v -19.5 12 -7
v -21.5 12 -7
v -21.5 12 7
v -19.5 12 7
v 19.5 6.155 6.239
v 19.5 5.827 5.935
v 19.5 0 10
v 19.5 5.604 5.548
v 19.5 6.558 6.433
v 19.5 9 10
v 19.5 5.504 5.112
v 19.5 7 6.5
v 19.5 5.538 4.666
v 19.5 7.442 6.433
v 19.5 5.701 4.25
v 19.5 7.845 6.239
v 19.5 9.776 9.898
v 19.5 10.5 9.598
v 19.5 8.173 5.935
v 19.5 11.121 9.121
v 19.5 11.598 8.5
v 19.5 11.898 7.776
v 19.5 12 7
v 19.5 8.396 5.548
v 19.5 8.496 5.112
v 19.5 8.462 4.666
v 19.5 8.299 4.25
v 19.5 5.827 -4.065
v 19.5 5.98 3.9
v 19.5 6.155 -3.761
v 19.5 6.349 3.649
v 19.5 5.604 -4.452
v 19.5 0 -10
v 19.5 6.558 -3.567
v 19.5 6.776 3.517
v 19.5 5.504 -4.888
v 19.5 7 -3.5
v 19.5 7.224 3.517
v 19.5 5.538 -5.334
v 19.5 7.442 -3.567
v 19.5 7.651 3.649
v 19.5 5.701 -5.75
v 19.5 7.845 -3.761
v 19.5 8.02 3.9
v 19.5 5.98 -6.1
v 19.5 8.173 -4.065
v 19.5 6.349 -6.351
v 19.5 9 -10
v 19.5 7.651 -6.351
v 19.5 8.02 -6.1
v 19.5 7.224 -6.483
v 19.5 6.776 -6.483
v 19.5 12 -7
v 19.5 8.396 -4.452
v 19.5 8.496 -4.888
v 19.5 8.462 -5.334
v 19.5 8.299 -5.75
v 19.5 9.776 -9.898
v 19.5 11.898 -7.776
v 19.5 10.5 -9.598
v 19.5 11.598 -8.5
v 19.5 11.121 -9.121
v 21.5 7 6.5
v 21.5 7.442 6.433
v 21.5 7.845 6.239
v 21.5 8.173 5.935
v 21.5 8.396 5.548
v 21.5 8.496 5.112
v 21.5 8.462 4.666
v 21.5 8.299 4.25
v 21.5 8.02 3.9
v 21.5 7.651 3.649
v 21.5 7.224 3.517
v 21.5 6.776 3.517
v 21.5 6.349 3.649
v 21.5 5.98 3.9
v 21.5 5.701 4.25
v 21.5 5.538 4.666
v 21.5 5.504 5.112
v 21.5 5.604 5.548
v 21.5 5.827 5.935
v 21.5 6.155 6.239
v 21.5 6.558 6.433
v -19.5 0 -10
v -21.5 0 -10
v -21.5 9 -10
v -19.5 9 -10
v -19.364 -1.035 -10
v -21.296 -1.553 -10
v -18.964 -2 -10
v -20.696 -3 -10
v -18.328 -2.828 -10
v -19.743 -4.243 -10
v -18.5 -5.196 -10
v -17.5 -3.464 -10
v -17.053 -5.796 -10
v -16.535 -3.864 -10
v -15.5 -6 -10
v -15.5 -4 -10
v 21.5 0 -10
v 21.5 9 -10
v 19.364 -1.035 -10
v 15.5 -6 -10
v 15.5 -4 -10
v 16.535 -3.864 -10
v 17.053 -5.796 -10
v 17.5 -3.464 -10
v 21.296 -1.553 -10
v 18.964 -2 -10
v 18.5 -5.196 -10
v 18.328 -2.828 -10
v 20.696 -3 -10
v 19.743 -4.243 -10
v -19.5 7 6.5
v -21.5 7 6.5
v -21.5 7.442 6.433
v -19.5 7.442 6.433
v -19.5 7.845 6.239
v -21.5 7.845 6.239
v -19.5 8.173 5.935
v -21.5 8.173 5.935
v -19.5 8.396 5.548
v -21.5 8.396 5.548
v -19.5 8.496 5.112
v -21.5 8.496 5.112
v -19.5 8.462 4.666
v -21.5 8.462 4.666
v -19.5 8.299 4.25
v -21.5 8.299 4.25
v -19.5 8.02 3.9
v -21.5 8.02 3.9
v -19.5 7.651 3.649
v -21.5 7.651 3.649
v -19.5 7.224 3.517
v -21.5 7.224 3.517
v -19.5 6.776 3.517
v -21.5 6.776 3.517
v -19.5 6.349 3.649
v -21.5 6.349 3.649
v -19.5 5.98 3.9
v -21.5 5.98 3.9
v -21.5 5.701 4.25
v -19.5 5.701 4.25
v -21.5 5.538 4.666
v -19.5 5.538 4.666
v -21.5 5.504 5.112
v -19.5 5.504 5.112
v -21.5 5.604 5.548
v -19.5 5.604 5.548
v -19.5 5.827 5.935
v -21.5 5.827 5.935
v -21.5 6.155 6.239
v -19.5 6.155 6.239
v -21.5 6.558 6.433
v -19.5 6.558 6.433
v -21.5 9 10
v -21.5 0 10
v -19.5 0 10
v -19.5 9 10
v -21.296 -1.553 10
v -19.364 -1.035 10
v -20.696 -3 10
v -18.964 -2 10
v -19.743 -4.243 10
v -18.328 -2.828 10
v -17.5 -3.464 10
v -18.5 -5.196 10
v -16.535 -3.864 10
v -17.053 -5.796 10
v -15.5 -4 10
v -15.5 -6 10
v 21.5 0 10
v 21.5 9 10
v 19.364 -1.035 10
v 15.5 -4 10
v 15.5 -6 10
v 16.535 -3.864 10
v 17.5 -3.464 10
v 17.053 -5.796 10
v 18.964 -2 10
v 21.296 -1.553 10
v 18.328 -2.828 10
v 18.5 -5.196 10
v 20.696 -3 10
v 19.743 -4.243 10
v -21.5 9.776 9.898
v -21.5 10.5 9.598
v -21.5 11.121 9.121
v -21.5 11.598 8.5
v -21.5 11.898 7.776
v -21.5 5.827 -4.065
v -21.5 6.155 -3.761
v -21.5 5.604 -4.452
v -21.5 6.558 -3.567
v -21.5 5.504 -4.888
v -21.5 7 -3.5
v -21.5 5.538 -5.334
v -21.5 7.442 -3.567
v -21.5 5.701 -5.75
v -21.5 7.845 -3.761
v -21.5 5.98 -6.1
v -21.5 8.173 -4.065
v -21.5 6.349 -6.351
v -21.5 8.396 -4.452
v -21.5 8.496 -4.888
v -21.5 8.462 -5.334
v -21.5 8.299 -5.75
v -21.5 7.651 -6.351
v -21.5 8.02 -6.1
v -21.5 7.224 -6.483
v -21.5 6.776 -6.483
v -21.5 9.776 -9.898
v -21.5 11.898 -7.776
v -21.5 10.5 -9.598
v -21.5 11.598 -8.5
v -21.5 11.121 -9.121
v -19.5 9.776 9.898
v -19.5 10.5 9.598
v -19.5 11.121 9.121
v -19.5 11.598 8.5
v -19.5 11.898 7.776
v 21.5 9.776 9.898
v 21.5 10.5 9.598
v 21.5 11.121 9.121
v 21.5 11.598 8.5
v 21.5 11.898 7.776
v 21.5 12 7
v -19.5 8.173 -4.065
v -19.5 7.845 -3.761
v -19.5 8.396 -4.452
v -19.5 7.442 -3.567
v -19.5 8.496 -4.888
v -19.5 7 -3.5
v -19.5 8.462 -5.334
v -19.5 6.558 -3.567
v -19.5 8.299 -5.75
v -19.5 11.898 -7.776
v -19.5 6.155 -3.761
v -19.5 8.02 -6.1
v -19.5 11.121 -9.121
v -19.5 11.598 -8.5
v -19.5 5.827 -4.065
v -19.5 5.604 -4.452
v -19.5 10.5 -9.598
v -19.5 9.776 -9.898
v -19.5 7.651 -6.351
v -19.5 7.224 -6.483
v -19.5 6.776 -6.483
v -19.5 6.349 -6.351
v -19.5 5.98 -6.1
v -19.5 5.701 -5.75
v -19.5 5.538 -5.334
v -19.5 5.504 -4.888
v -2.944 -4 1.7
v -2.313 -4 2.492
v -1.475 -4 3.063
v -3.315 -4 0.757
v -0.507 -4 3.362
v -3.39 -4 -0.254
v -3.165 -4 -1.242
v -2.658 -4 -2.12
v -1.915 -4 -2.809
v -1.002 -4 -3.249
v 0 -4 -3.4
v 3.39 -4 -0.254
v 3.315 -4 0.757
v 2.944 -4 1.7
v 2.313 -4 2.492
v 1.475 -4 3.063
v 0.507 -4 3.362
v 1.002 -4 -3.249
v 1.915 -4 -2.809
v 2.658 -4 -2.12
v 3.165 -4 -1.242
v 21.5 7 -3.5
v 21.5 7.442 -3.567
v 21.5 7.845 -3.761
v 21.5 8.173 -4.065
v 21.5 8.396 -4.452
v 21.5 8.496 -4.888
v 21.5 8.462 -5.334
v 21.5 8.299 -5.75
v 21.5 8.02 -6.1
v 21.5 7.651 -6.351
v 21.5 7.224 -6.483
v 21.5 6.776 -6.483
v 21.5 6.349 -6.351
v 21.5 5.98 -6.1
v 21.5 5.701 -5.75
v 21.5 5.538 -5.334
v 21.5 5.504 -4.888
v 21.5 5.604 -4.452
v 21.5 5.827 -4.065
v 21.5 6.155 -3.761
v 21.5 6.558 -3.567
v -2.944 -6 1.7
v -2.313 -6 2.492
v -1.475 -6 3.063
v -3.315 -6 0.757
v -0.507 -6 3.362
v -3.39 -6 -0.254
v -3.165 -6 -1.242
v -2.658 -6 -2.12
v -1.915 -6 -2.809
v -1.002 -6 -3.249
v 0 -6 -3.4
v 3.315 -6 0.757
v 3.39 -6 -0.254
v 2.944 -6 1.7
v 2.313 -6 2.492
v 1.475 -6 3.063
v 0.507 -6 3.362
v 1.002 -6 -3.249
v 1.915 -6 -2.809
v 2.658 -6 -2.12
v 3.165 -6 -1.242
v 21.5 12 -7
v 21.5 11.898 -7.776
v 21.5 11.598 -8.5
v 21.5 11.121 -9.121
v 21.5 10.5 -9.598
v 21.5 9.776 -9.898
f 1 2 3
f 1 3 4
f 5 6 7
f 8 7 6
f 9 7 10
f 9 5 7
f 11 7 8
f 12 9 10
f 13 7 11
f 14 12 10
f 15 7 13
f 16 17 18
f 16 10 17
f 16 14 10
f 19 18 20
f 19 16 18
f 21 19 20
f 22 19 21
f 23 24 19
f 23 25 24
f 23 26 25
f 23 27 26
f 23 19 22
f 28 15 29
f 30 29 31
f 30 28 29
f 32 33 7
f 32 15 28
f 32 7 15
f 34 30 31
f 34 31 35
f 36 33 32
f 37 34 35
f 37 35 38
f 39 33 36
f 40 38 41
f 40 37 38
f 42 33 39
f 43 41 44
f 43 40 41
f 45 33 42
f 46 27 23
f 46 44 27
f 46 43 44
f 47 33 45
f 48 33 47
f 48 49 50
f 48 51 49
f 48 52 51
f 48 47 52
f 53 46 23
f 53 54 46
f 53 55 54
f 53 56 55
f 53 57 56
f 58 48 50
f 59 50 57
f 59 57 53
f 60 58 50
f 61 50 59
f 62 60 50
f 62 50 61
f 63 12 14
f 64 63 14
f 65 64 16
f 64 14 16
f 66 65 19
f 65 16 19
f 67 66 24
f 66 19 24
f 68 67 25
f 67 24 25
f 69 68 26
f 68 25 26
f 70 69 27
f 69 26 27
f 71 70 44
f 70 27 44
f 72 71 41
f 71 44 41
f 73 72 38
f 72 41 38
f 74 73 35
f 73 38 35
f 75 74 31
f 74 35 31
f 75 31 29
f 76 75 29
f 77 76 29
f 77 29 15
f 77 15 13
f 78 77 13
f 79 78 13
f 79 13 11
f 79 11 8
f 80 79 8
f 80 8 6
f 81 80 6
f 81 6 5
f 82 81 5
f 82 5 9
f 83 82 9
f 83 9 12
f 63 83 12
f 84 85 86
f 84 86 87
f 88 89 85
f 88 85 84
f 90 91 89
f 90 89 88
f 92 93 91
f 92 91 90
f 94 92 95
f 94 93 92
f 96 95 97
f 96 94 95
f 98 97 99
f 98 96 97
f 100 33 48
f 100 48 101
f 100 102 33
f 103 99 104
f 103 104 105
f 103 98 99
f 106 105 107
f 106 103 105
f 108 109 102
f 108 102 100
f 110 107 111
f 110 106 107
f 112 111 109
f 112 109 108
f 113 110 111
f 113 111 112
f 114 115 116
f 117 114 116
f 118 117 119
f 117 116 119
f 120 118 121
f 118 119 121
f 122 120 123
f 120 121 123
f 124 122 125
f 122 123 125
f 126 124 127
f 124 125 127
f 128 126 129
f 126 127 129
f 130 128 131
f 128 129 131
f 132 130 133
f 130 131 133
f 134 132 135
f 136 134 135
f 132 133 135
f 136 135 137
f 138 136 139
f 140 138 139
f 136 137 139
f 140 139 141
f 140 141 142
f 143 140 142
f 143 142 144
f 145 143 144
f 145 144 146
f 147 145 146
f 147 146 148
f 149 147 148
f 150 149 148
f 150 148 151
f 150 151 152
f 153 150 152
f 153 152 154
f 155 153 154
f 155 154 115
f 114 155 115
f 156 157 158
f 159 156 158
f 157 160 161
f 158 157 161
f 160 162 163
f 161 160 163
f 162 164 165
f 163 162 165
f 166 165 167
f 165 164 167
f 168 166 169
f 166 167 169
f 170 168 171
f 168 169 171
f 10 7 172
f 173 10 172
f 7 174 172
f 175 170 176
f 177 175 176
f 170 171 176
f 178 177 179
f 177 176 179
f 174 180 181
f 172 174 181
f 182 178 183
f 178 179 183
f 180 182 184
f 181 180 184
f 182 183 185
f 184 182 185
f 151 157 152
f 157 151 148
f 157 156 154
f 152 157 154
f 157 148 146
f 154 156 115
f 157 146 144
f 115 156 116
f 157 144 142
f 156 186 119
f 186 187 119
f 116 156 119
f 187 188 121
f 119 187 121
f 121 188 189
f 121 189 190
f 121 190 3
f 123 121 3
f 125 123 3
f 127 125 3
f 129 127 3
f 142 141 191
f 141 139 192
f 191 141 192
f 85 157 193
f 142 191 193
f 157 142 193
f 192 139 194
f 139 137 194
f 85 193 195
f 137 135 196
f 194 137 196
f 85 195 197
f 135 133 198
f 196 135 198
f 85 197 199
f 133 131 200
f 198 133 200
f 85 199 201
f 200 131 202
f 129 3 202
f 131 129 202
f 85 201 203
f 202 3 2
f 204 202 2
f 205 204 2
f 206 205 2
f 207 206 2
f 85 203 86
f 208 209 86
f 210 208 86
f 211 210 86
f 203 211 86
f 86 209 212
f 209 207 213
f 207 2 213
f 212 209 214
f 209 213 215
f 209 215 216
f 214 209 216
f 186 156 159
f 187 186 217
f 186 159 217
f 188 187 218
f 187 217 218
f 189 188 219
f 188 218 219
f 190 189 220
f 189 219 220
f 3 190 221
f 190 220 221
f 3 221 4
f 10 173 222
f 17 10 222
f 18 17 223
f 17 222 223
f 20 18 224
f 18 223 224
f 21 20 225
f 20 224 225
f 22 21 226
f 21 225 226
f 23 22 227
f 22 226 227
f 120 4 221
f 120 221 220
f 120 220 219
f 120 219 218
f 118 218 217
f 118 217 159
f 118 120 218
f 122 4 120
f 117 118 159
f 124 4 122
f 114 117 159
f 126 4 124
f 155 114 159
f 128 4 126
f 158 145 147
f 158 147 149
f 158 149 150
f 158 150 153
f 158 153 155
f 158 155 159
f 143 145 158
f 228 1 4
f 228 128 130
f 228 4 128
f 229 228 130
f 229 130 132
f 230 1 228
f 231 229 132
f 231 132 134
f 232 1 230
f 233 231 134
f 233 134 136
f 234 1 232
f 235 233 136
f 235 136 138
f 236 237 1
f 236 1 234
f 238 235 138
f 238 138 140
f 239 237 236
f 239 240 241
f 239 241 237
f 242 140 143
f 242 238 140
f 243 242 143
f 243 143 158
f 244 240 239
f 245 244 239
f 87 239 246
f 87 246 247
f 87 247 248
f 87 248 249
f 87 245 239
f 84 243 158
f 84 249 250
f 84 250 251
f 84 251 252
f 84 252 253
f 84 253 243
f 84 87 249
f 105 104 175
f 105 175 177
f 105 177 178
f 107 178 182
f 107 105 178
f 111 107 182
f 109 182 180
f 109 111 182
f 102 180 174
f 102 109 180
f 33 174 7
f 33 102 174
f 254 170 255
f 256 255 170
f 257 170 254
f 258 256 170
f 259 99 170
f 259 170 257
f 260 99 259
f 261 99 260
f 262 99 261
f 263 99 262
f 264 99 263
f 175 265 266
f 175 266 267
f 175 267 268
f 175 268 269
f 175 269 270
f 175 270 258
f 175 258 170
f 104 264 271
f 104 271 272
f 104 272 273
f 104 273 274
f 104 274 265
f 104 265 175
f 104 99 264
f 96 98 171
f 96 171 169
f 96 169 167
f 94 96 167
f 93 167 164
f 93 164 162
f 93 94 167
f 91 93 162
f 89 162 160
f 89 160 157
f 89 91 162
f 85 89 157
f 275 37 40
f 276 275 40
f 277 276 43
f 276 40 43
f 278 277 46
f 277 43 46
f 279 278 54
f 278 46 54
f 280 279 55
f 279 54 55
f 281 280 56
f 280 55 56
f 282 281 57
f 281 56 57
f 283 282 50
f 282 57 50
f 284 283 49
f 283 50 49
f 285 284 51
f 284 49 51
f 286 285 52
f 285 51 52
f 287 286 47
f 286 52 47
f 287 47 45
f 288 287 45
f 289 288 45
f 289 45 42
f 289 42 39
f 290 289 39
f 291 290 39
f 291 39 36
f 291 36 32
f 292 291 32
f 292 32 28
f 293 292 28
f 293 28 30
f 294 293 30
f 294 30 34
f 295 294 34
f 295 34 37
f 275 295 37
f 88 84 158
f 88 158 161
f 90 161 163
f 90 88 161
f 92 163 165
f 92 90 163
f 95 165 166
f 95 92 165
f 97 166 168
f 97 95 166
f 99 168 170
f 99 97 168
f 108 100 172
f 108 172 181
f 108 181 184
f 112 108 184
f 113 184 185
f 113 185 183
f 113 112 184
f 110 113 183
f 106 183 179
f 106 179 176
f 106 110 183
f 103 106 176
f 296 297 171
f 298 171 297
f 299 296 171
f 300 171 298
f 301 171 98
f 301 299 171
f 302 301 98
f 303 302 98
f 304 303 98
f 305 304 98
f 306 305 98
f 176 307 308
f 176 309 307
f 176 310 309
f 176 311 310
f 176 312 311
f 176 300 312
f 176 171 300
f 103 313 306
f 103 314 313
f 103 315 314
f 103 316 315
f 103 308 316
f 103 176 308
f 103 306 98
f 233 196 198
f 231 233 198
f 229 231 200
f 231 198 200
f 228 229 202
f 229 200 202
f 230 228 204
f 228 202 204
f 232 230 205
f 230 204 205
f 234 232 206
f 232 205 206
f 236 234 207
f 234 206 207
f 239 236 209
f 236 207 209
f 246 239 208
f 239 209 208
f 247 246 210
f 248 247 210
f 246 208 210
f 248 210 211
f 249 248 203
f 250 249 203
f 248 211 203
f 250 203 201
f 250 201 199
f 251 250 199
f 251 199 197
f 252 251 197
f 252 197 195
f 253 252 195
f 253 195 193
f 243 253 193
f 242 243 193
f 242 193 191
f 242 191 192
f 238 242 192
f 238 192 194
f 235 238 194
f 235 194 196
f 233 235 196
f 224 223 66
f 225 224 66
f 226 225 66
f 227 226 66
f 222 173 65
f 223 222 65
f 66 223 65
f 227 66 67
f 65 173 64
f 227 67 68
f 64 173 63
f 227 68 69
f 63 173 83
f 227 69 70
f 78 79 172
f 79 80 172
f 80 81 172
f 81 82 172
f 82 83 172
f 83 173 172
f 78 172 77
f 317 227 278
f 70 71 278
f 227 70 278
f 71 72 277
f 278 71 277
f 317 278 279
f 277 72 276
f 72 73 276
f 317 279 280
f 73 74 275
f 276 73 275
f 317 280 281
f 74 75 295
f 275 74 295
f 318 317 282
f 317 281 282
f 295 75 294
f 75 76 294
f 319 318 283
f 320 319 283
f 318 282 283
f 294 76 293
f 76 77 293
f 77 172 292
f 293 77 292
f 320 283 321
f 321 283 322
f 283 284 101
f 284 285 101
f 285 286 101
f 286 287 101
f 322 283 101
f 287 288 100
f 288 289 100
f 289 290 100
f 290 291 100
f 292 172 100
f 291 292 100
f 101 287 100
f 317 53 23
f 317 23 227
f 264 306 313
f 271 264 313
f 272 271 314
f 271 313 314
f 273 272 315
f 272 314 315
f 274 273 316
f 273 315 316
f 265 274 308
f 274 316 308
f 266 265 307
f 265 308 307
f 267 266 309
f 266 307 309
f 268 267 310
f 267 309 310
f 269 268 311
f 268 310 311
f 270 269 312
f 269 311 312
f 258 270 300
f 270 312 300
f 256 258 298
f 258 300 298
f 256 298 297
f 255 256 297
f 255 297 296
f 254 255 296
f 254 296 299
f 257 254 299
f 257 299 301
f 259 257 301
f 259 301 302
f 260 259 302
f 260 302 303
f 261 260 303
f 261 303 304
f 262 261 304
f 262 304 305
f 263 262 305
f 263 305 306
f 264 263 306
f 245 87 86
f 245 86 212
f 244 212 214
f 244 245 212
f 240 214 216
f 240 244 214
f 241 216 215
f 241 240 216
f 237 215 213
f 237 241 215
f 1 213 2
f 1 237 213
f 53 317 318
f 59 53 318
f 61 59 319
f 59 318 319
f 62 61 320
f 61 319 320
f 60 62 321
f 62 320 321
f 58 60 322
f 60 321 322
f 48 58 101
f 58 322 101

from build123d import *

# Parameters (mm, degrees)
SKETCH1_W            = 20
SKETCH1_H            = 6
BOSS_EXTRUDE1_DEPTH  = 21.5
SKETCH2_W            = 6
SKETCH2_H            = 20
BOSS_EXTRUDE2_DEPTH  = 12
SKETCH7_R            = 1.5
CUT_EXTRUDE1_DEPTH   = 46.749316935
SKETCH8_R            = 3.4
CUT_EXTRUDE2_DEPTH   = 30.769951293
FILLET2_R            = 3
CONVERT_SOLID2_START = -10
CONVERT_SOLID2_DEPTH = 20


# Read off the part's stored shape, not the designer's step: Convert-Solid2
with BuildPart() as part:
    # Sketch1 → Boss-Extrude1 (new, symmetric)
    with BuildSketch(Plane(origin=(0, 0, 0), x_dir=(0, 0, -1), z_dir=(1, 0, 0))):
        with Locations((0, -3)):
            Rectangle(SKETCH1_W, SKETCH1_H)
    extrude(amount=BOSS_EXTRUDE1_DEPTH, both=True)

    # Sketch2 → Boss-Extrude2 (add)
    with BuildSketch(Plane(origin=(0, 0, 0), x_dir=(1, 0, 0), z_dir=(0, 1, 0))):
        with Locations((18.5, 0)):
            Rectangle(SKETCH2_W, SKETCH2_H)
        with Locations((-18.5, 0)):
            Rectangle(SKETCH2_W, SKETCH2_H)
    extrude(amount=BOSS_EXTRUDE2_DEPTH)

    # Sketch7 → Cut-Extrude1 (cut, through all)
    with BuildSketch(Plane.ZY.offset(21.5)):
        with Locations((-5, 7)):
            Circle(SKETCH7_R)
        with Locations((5, 7)):
            Circle(SKETCH7_R)
    extrude(amount=-CUT_EXTRUDE1_DEPTH, mode=Mode.SUBTRACT)

    # Sketch8 → Cut-Extrude2 (cut, through all)
    with BuildSketch(Plane.XZ.offset(6)):
        with Locations(Location((0, 0, 0), (0, 0, 270))):
            Circle(SKETCH8_R)
    extrude(amount=-CUT_EXTRUDE2_DEPTH, mode=Mode.SUBTRACT)

    # Fillet2
    fillet2_edges = [part.edges().sort_by_distance(p)[0] for p in [
        (-18.5, 12, 10),
        (-18.5, 12, -10),
        (18.5, 12, -10),
        (18.5, 12, 10),
    ]]
    fillet(fillet2_edges, radius=FILLET2_R)

    # Convert-Solid2 outline → Convert-Solid2 (cut)
    with BuildSketch(Plane.XY.offset(CONVERT_SOLID2_START)):
        with BuildLine():
            Line((21.5, -6), (21.5, 0))
            ThreePointArc((21.5, 0), (19.742640687, -4.242640687), (15.5, -6))
            Line((15.5, -6), (21.5, -6))
        make_face()
        with BuildLine():
            Line((-21.5, -6), (-15.5, -6))
            ThreePointArc((-15.5, -6), (-19.742640687, -4.242640687), (-21.5, 0))
            Line((-21.5, 0), (-21.5, -6))
        make_face()
        with BuildLine():
            Line((19.5, 0), (19.5, 12))
            Line((19.5, 12), (15.5, 12))
            Line((15.5, 12), (15.5, 0))
            Line((15.5, 0), (-15.5, 0))
            Line((-15.5, 0), (-15.5, 12))
            Line((-15.5, 12), (-19.5, 12))
            Line((-19.5, 12), (-19.5, 0))
            ThreePointArc((-19.5, 0), (-18.328427125, -2.828427125), (-15.5, -4))
            Line((-15.5, -4), (15.5, -4))
            ThreePointArc((15.5, -4), (18.328427125, -2.828427125), (19.5, 0))
        make_face()
    extrude(amount=CONVERT_SOLID2_DEPTH, mode=Mode.SUBTRACT)


solid = part.part
